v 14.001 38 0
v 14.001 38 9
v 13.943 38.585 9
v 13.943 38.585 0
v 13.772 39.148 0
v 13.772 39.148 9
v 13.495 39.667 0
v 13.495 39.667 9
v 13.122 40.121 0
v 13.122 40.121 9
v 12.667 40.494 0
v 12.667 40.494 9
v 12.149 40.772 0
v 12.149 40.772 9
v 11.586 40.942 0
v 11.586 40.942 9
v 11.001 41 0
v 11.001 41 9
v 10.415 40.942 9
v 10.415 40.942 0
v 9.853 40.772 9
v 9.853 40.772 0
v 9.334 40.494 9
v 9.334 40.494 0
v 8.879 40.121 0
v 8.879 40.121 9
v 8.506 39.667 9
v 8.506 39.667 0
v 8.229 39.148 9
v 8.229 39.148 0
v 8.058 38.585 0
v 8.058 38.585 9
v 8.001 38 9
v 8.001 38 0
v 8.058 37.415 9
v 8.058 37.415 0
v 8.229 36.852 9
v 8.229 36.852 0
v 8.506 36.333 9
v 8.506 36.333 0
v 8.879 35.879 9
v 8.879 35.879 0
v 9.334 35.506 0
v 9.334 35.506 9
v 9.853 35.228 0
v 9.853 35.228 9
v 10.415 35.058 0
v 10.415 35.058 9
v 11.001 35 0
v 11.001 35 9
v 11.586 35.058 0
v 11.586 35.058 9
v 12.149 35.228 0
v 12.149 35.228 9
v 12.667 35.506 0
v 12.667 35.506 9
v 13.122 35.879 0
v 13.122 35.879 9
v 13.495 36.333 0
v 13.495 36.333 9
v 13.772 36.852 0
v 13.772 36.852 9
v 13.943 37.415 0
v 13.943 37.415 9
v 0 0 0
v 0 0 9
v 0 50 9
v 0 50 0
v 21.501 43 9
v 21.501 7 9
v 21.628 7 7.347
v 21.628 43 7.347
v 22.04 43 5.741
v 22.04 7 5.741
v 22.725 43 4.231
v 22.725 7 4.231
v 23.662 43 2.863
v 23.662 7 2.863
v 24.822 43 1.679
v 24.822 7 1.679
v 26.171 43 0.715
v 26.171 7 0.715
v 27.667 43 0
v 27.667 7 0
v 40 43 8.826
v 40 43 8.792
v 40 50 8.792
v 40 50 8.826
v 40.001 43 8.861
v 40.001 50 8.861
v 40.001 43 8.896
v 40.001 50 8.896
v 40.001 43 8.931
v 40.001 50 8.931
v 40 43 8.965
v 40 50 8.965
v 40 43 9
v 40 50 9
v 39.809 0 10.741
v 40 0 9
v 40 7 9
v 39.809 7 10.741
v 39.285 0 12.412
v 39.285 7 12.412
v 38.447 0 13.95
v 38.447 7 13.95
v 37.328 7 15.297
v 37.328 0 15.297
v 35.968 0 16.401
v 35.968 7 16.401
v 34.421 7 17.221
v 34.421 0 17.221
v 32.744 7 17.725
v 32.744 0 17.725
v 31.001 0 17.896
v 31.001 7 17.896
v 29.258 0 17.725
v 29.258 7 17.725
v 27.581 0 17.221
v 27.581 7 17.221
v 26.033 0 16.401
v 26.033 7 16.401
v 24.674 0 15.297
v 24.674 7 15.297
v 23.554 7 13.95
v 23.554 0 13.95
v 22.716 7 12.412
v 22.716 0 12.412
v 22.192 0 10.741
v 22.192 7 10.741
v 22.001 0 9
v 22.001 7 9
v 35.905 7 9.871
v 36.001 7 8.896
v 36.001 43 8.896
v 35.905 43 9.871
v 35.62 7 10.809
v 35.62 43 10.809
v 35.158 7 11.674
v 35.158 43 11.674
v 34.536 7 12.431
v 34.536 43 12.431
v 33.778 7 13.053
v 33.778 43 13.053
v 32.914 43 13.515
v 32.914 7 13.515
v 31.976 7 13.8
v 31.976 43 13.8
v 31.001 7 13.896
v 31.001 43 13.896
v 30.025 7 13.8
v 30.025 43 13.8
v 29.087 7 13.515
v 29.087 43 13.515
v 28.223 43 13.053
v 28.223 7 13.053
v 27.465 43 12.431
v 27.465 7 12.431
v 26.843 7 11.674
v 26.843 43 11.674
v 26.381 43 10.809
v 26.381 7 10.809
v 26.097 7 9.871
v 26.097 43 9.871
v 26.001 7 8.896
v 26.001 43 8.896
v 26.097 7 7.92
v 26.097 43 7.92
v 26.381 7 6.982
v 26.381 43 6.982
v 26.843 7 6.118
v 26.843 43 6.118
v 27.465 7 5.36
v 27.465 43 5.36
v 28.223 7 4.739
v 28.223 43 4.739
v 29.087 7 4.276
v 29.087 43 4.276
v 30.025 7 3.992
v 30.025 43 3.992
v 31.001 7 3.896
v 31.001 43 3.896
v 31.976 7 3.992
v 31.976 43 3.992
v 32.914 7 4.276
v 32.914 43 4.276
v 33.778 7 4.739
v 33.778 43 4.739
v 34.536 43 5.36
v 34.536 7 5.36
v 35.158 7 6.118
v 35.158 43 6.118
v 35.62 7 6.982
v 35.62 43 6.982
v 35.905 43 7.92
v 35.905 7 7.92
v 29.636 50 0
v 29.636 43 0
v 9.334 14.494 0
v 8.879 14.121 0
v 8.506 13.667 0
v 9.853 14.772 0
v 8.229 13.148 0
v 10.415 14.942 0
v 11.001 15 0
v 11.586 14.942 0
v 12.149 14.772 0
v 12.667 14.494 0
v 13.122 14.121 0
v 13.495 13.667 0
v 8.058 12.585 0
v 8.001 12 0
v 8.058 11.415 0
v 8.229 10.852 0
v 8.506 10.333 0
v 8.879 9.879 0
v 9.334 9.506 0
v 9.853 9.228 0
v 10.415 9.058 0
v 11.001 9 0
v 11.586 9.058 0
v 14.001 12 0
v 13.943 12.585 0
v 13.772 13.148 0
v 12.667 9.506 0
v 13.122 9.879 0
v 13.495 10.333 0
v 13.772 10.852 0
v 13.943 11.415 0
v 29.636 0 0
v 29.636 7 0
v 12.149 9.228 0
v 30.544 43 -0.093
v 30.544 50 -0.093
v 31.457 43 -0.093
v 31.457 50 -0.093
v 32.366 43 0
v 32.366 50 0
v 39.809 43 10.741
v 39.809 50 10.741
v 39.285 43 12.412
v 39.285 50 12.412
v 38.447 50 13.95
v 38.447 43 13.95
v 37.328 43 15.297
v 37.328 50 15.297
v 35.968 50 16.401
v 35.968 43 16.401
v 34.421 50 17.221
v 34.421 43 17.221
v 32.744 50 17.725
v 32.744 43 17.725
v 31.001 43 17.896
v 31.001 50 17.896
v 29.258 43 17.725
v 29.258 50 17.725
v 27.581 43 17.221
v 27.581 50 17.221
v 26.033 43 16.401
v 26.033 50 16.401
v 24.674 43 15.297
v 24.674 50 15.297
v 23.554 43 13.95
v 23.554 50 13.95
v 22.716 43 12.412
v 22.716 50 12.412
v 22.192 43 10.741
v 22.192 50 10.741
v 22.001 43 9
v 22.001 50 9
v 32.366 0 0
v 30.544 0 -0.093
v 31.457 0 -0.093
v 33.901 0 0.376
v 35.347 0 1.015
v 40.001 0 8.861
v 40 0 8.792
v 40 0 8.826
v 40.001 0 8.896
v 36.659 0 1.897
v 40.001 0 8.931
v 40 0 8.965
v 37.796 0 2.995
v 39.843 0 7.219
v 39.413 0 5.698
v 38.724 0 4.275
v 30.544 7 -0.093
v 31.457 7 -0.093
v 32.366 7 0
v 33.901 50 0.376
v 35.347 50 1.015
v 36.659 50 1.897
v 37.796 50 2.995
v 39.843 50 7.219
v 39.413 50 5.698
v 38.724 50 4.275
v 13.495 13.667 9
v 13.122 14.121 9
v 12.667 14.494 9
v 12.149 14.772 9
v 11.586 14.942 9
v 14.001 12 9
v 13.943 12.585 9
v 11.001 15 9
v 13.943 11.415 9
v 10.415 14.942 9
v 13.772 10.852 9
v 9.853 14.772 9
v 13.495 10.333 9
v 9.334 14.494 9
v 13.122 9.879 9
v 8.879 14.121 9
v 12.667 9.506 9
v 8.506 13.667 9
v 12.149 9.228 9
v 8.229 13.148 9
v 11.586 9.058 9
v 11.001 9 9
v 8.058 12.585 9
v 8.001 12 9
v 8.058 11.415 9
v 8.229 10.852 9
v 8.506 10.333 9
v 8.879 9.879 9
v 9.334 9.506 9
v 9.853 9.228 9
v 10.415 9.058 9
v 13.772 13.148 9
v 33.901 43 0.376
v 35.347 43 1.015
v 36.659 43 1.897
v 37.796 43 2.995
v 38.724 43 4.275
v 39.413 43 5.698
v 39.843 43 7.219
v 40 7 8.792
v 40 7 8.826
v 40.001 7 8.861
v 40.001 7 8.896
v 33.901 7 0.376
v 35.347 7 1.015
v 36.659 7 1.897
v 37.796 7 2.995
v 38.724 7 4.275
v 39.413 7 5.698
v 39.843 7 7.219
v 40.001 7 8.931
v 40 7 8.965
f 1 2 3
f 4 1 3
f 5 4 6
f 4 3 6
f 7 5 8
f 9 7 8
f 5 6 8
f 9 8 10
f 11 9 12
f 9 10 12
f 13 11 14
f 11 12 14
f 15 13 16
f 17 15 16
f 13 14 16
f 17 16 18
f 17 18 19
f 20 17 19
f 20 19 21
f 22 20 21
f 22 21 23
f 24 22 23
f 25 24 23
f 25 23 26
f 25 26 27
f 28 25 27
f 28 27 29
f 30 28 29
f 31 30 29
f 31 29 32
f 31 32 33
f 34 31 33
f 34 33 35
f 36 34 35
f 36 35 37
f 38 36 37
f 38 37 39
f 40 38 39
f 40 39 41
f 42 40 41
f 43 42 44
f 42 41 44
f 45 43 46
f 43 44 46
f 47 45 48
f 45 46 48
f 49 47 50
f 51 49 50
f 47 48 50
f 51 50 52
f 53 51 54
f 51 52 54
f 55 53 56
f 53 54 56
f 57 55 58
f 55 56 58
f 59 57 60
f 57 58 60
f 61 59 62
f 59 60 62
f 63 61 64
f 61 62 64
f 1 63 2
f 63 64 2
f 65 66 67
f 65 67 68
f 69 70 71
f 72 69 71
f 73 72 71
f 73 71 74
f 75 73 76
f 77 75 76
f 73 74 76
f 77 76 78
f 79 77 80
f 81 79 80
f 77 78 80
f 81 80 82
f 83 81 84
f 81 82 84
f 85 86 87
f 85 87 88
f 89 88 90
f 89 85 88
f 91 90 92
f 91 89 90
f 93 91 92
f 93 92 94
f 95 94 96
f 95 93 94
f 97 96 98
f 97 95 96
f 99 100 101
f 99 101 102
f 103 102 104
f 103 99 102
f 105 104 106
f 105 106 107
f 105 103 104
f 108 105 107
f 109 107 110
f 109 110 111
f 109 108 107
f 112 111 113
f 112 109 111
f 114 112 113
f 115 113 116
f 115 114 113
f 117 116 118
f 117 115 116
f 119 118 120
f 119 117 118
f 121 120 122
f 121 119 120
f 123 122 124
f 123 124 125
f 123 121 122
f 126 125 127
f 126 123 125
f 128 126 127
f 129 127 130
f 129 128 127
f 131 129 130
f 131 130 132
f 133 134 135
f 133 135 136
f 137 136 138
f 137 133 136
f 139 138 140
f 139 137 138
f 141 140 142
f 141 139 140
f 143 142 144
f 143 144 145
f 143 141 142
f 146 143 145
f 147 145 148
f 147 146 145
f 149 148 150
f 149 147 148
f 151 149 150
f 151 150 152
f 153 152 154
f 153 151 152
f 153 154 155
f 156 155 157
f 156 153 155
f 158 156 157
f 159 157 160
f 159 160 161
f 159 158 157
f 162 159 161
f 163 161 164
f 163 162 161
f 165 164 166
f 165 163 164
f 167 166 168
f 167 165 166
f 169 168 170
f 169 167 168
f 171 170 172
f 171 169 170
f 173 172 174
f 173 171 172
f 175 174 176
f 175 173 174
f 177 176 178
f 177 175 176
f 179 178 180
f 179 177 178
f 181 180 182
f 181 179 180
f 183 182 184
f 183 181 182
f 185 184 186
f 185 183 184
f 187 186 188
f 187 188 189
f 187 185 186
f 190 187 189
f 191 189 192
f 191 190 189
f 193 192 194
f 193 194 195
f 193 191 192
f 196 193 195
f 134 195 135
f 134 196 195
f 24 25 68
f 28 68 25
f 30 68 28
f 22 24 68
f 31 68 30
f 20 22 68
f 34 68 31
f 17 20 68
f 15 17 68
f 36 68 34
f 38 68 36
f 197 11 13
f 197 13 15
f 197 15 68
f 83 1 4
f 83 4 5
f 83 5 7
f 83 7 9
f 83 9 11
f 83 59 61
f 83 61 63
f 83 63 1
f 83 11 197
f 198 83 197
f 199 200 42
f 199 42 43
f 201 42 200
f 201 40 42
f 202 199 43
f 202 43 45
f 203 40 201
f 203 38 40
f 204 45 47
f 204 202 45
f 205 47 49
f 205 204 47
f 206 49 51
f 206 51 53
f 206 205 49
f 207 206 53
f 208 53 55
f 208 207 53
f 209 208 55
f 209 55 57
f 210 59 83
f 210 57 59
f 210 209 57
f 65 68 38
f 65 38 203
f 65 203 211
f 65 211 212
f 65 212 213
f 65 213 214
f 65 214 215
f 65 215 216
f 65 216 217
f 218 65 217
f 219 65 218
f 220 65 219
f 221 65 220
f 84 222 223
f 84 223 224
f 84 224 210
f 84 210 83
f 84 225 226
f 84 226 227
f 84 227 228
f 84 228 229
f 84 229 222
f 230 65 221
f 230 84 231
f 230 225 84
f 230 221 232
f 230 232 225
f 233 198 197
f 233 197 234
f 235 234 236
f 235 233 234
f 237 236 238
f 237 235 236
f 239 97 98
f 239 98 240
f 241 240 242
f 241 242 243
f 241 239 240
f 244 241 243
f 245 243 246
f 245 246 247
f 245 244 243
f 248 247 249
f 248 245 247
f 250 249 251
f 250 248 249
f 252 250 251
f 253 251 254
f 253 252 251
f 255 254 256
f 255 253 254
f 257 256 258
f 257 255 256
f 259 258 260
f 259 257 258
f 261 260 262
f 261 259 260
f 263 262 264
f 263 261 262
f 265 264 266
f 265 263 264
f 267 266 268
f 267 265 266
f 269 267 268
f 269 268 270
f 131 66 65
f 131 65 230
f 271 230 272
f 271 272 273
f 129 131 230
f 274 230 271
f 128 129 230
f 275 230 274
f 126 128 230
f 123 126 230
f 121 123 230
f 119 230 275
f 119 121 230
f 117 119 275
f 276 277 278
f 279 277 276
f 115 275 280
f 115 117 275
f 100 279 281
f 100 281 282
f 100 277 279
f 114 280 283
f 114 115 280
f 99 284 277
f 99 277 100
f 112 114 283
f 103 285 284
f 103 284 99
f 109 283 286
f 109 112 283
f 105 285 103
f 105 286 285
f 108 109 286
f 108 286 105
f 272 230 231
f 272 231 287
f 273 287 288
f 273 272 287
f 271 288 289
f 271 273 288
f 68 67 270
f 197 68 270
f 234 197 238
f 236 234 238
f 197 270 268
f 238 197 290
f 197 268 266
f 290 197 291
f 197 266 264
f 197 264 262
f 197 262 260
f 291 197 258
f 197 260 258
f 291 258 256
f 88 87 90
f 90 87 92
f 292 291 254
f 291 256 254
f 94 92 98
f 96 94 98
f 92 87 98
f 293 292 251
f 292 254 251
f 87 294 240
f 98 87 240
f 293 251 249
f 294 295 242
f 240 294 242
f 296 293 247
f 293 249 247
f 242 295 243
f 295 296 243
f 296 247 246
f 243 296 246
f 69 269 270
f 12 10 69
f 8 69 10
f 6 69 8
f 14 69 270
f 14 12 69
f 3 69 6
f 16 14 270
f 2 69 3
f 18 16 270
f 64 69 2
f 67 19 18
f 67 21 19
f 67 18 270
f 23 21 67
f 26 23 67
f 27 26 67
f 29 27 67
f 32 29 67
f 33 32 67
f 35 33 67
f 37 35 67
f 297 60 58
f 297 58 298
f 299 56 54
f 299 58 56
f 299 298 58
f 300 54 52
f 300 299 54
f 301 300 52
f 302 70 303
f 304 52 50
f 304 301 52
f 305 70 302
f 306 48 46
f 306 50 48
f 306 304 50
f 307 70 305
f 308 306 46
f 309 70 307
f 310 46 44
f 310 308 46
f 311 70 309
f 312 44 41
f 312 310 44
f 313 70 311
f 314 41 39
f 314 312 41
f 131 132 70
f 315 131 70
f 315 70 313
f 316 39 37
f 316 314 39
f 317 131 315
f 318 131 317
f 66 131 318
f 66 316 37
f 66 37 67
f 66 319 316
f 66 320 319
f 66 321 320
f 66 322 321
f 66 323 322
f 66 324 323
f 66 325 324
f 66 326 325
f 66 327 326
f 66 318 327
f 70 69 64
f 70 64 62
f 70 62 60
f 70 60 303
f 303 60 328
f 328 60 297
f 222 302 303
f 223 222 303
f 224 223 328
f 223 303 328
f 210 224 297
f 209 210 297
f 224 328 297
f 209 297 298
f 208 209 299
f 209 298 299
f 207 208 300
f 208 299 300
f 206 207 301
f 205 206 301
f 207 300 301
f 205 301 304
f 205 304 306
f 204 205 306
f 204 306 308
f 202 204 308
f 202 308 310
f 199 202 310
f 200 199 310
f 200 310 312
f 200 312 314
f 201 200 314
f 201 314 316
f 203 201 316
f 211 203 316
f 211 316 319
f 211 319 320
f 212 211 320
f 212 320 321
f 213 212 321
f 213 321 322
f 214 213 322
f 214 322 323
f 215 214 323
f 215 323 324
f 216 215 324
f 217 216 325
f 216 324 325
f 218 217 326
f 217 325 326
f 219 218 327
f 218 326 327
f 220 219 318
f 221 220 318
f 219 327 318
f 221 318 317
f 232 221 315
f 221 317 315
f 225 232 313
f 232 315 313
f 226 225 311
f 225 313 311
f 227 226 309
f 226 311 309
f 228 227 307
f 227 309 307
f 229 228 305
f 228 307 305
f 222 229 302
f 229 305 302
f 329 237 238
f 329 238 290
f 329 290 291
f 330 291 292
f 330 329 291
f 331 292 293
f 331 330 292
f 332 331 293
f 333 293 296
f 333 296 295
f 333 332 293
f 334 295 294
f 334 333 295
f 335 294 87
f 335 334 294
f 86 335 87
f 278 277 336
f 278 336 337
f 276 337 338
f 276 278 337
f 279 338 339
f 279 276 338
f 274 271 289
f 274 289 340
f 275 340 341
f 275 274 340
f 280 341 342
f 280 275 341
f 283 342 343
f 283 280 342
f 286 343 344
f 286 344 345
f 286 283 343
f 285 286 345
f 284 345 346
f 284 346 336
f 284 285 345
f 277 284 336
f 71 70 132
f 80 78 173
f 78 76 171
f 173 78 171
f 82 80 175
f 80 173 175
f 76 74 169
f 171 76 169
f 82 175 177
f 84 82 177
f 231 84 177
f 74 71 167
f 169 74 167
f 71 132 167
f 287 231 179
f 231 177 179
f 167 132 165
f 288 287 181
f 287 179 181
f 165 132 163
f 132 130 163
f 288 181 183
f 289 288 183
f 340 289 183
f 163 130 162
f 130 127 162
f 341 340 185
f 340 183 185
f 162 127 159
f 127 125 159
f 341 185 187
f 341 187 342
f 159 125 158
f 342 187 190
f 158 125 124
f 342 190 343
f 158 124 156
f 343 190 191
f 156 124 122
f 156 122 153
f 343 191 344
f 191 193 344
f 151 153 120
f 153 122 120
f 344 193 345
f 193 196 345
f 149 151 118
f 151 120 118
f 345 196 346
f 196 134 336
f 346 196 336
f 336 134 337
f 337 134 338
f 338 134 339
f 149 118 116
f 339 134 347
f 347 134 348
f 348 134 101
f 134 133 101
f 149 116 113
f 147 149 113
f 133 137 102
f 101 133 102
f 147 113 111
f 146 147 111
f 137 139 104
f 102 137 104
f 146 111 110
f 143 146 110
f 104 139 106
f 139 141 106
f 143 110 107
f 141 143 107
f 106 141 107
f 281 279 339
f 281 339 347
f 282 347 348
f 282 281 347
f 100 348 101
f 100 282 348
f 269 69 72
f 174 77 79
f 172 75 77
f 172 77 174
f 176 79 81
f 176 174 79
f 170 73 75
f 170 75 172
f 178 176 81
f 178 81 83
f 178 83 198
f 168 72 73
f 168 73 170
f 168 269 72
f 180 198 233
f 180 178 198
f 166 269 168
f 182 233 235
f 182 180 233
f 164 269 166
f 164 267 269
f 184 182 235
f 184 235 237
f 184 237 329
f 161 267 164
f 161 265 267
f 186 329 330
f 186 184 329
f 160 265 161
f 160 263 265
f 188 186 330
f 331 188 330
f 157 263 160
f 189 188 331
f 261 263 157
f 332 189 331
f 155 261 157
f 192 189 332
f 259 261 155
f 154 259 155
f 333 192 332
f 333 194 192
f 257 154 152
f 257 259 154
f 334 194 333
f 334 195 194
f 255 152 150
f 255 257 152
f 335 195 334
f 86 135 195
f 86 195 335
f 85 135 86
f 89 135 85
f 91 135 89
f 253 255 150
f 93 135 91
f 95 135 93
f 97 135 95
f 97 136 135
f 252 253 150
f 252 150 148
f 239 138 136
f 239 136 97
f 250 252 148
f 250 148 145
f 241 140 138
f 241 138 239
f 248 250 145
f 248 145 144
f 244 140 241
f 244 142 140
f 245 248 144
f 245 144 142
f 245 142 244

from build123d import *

# Parameters (mm, degrees)
F1_DEPTH = 50
F2_R     = 3
F3_DEPTH = 25
F5_R     = 9.5
F5_R_2   = 5
F6_DEPTH = 36


with BuildPart() as f1:
    # F0 (on Front) → F1 (new body)
    with BuildSketch(Plane.XZ):
        with BuildLine():
            Line((0, 9), (0, 0))
            Line((0, 0), (29.635604471, 0))
            ThreePointArc((29.635604471, 0), (24.1372813391, 3.0739592866), (22.0012044628, 9))
            Line((22.0012044628, 9), (0, 9))
        make_face()
        with BuildLine():
            ThreePointArc((22.0012044628, 9), (24.1372813391, 3.0739592866), (29.635604471, 0))
            Line((29.635604471, 0), (32.3655999918, 0))
            ThreePointArc((32.3655999918, 0), (37.7961142893, 2.9949521539), (40, 8.7917712569))
            Line((40, 8.7917712569), (40, 9))
            ThreePointArc((40, 9), (31.0006022314, 17.8958856284), (22.0012044628, 9))
        make_face()
        with BuildLine():
            Line((32.3655999918, 0), (29.635604471, 0))
            ThreePointArc((29.635604471, 0), (31.0006022314, -0.1041143716), (32.3655999918, 0))
        make_face()
        with BuildLine():
            Line((40, 9), (40, 8.7917712569))
            ThreePointArc((40, 8.7917712569), (40.0004516723, 8.8438275718), (40.0006022314, 8.8958856284))
            ThreePointArc((40.0006022314, 8.8958856284), (40.0004516723, 8.9479436851), (40, 9))
        make_face()
    extrude(amount=-F1_DEPTH)

    # F2 (on face) → F3 (cut)
    with BuildSketch(Plane.XY.offset(9)):
        with Locations((11.0006022314, 38)):
            Circle(F2_R)
        with Locations((11.0006022314, 12)):
            Circle(F2_R)
    extrude(amount=-F3_DEPTH, mode=Mode.SUBTRACT)

    # F5 (on offset) → F6 (cut)
    with BuildSketch(Plane.XZ.offset(-7)):
        with Locations((31.0006022314, 8.8958856284)):
            Circle(F5_R)
        with Locations((31.0006022314, 8.8958856284)):
            Circle(F5_R_2, mode=Mode.SUBTRACT)
    extrude(amount=-F6_DEPTH, mode=Mode.SUBTRACT)


solid = f1.part
